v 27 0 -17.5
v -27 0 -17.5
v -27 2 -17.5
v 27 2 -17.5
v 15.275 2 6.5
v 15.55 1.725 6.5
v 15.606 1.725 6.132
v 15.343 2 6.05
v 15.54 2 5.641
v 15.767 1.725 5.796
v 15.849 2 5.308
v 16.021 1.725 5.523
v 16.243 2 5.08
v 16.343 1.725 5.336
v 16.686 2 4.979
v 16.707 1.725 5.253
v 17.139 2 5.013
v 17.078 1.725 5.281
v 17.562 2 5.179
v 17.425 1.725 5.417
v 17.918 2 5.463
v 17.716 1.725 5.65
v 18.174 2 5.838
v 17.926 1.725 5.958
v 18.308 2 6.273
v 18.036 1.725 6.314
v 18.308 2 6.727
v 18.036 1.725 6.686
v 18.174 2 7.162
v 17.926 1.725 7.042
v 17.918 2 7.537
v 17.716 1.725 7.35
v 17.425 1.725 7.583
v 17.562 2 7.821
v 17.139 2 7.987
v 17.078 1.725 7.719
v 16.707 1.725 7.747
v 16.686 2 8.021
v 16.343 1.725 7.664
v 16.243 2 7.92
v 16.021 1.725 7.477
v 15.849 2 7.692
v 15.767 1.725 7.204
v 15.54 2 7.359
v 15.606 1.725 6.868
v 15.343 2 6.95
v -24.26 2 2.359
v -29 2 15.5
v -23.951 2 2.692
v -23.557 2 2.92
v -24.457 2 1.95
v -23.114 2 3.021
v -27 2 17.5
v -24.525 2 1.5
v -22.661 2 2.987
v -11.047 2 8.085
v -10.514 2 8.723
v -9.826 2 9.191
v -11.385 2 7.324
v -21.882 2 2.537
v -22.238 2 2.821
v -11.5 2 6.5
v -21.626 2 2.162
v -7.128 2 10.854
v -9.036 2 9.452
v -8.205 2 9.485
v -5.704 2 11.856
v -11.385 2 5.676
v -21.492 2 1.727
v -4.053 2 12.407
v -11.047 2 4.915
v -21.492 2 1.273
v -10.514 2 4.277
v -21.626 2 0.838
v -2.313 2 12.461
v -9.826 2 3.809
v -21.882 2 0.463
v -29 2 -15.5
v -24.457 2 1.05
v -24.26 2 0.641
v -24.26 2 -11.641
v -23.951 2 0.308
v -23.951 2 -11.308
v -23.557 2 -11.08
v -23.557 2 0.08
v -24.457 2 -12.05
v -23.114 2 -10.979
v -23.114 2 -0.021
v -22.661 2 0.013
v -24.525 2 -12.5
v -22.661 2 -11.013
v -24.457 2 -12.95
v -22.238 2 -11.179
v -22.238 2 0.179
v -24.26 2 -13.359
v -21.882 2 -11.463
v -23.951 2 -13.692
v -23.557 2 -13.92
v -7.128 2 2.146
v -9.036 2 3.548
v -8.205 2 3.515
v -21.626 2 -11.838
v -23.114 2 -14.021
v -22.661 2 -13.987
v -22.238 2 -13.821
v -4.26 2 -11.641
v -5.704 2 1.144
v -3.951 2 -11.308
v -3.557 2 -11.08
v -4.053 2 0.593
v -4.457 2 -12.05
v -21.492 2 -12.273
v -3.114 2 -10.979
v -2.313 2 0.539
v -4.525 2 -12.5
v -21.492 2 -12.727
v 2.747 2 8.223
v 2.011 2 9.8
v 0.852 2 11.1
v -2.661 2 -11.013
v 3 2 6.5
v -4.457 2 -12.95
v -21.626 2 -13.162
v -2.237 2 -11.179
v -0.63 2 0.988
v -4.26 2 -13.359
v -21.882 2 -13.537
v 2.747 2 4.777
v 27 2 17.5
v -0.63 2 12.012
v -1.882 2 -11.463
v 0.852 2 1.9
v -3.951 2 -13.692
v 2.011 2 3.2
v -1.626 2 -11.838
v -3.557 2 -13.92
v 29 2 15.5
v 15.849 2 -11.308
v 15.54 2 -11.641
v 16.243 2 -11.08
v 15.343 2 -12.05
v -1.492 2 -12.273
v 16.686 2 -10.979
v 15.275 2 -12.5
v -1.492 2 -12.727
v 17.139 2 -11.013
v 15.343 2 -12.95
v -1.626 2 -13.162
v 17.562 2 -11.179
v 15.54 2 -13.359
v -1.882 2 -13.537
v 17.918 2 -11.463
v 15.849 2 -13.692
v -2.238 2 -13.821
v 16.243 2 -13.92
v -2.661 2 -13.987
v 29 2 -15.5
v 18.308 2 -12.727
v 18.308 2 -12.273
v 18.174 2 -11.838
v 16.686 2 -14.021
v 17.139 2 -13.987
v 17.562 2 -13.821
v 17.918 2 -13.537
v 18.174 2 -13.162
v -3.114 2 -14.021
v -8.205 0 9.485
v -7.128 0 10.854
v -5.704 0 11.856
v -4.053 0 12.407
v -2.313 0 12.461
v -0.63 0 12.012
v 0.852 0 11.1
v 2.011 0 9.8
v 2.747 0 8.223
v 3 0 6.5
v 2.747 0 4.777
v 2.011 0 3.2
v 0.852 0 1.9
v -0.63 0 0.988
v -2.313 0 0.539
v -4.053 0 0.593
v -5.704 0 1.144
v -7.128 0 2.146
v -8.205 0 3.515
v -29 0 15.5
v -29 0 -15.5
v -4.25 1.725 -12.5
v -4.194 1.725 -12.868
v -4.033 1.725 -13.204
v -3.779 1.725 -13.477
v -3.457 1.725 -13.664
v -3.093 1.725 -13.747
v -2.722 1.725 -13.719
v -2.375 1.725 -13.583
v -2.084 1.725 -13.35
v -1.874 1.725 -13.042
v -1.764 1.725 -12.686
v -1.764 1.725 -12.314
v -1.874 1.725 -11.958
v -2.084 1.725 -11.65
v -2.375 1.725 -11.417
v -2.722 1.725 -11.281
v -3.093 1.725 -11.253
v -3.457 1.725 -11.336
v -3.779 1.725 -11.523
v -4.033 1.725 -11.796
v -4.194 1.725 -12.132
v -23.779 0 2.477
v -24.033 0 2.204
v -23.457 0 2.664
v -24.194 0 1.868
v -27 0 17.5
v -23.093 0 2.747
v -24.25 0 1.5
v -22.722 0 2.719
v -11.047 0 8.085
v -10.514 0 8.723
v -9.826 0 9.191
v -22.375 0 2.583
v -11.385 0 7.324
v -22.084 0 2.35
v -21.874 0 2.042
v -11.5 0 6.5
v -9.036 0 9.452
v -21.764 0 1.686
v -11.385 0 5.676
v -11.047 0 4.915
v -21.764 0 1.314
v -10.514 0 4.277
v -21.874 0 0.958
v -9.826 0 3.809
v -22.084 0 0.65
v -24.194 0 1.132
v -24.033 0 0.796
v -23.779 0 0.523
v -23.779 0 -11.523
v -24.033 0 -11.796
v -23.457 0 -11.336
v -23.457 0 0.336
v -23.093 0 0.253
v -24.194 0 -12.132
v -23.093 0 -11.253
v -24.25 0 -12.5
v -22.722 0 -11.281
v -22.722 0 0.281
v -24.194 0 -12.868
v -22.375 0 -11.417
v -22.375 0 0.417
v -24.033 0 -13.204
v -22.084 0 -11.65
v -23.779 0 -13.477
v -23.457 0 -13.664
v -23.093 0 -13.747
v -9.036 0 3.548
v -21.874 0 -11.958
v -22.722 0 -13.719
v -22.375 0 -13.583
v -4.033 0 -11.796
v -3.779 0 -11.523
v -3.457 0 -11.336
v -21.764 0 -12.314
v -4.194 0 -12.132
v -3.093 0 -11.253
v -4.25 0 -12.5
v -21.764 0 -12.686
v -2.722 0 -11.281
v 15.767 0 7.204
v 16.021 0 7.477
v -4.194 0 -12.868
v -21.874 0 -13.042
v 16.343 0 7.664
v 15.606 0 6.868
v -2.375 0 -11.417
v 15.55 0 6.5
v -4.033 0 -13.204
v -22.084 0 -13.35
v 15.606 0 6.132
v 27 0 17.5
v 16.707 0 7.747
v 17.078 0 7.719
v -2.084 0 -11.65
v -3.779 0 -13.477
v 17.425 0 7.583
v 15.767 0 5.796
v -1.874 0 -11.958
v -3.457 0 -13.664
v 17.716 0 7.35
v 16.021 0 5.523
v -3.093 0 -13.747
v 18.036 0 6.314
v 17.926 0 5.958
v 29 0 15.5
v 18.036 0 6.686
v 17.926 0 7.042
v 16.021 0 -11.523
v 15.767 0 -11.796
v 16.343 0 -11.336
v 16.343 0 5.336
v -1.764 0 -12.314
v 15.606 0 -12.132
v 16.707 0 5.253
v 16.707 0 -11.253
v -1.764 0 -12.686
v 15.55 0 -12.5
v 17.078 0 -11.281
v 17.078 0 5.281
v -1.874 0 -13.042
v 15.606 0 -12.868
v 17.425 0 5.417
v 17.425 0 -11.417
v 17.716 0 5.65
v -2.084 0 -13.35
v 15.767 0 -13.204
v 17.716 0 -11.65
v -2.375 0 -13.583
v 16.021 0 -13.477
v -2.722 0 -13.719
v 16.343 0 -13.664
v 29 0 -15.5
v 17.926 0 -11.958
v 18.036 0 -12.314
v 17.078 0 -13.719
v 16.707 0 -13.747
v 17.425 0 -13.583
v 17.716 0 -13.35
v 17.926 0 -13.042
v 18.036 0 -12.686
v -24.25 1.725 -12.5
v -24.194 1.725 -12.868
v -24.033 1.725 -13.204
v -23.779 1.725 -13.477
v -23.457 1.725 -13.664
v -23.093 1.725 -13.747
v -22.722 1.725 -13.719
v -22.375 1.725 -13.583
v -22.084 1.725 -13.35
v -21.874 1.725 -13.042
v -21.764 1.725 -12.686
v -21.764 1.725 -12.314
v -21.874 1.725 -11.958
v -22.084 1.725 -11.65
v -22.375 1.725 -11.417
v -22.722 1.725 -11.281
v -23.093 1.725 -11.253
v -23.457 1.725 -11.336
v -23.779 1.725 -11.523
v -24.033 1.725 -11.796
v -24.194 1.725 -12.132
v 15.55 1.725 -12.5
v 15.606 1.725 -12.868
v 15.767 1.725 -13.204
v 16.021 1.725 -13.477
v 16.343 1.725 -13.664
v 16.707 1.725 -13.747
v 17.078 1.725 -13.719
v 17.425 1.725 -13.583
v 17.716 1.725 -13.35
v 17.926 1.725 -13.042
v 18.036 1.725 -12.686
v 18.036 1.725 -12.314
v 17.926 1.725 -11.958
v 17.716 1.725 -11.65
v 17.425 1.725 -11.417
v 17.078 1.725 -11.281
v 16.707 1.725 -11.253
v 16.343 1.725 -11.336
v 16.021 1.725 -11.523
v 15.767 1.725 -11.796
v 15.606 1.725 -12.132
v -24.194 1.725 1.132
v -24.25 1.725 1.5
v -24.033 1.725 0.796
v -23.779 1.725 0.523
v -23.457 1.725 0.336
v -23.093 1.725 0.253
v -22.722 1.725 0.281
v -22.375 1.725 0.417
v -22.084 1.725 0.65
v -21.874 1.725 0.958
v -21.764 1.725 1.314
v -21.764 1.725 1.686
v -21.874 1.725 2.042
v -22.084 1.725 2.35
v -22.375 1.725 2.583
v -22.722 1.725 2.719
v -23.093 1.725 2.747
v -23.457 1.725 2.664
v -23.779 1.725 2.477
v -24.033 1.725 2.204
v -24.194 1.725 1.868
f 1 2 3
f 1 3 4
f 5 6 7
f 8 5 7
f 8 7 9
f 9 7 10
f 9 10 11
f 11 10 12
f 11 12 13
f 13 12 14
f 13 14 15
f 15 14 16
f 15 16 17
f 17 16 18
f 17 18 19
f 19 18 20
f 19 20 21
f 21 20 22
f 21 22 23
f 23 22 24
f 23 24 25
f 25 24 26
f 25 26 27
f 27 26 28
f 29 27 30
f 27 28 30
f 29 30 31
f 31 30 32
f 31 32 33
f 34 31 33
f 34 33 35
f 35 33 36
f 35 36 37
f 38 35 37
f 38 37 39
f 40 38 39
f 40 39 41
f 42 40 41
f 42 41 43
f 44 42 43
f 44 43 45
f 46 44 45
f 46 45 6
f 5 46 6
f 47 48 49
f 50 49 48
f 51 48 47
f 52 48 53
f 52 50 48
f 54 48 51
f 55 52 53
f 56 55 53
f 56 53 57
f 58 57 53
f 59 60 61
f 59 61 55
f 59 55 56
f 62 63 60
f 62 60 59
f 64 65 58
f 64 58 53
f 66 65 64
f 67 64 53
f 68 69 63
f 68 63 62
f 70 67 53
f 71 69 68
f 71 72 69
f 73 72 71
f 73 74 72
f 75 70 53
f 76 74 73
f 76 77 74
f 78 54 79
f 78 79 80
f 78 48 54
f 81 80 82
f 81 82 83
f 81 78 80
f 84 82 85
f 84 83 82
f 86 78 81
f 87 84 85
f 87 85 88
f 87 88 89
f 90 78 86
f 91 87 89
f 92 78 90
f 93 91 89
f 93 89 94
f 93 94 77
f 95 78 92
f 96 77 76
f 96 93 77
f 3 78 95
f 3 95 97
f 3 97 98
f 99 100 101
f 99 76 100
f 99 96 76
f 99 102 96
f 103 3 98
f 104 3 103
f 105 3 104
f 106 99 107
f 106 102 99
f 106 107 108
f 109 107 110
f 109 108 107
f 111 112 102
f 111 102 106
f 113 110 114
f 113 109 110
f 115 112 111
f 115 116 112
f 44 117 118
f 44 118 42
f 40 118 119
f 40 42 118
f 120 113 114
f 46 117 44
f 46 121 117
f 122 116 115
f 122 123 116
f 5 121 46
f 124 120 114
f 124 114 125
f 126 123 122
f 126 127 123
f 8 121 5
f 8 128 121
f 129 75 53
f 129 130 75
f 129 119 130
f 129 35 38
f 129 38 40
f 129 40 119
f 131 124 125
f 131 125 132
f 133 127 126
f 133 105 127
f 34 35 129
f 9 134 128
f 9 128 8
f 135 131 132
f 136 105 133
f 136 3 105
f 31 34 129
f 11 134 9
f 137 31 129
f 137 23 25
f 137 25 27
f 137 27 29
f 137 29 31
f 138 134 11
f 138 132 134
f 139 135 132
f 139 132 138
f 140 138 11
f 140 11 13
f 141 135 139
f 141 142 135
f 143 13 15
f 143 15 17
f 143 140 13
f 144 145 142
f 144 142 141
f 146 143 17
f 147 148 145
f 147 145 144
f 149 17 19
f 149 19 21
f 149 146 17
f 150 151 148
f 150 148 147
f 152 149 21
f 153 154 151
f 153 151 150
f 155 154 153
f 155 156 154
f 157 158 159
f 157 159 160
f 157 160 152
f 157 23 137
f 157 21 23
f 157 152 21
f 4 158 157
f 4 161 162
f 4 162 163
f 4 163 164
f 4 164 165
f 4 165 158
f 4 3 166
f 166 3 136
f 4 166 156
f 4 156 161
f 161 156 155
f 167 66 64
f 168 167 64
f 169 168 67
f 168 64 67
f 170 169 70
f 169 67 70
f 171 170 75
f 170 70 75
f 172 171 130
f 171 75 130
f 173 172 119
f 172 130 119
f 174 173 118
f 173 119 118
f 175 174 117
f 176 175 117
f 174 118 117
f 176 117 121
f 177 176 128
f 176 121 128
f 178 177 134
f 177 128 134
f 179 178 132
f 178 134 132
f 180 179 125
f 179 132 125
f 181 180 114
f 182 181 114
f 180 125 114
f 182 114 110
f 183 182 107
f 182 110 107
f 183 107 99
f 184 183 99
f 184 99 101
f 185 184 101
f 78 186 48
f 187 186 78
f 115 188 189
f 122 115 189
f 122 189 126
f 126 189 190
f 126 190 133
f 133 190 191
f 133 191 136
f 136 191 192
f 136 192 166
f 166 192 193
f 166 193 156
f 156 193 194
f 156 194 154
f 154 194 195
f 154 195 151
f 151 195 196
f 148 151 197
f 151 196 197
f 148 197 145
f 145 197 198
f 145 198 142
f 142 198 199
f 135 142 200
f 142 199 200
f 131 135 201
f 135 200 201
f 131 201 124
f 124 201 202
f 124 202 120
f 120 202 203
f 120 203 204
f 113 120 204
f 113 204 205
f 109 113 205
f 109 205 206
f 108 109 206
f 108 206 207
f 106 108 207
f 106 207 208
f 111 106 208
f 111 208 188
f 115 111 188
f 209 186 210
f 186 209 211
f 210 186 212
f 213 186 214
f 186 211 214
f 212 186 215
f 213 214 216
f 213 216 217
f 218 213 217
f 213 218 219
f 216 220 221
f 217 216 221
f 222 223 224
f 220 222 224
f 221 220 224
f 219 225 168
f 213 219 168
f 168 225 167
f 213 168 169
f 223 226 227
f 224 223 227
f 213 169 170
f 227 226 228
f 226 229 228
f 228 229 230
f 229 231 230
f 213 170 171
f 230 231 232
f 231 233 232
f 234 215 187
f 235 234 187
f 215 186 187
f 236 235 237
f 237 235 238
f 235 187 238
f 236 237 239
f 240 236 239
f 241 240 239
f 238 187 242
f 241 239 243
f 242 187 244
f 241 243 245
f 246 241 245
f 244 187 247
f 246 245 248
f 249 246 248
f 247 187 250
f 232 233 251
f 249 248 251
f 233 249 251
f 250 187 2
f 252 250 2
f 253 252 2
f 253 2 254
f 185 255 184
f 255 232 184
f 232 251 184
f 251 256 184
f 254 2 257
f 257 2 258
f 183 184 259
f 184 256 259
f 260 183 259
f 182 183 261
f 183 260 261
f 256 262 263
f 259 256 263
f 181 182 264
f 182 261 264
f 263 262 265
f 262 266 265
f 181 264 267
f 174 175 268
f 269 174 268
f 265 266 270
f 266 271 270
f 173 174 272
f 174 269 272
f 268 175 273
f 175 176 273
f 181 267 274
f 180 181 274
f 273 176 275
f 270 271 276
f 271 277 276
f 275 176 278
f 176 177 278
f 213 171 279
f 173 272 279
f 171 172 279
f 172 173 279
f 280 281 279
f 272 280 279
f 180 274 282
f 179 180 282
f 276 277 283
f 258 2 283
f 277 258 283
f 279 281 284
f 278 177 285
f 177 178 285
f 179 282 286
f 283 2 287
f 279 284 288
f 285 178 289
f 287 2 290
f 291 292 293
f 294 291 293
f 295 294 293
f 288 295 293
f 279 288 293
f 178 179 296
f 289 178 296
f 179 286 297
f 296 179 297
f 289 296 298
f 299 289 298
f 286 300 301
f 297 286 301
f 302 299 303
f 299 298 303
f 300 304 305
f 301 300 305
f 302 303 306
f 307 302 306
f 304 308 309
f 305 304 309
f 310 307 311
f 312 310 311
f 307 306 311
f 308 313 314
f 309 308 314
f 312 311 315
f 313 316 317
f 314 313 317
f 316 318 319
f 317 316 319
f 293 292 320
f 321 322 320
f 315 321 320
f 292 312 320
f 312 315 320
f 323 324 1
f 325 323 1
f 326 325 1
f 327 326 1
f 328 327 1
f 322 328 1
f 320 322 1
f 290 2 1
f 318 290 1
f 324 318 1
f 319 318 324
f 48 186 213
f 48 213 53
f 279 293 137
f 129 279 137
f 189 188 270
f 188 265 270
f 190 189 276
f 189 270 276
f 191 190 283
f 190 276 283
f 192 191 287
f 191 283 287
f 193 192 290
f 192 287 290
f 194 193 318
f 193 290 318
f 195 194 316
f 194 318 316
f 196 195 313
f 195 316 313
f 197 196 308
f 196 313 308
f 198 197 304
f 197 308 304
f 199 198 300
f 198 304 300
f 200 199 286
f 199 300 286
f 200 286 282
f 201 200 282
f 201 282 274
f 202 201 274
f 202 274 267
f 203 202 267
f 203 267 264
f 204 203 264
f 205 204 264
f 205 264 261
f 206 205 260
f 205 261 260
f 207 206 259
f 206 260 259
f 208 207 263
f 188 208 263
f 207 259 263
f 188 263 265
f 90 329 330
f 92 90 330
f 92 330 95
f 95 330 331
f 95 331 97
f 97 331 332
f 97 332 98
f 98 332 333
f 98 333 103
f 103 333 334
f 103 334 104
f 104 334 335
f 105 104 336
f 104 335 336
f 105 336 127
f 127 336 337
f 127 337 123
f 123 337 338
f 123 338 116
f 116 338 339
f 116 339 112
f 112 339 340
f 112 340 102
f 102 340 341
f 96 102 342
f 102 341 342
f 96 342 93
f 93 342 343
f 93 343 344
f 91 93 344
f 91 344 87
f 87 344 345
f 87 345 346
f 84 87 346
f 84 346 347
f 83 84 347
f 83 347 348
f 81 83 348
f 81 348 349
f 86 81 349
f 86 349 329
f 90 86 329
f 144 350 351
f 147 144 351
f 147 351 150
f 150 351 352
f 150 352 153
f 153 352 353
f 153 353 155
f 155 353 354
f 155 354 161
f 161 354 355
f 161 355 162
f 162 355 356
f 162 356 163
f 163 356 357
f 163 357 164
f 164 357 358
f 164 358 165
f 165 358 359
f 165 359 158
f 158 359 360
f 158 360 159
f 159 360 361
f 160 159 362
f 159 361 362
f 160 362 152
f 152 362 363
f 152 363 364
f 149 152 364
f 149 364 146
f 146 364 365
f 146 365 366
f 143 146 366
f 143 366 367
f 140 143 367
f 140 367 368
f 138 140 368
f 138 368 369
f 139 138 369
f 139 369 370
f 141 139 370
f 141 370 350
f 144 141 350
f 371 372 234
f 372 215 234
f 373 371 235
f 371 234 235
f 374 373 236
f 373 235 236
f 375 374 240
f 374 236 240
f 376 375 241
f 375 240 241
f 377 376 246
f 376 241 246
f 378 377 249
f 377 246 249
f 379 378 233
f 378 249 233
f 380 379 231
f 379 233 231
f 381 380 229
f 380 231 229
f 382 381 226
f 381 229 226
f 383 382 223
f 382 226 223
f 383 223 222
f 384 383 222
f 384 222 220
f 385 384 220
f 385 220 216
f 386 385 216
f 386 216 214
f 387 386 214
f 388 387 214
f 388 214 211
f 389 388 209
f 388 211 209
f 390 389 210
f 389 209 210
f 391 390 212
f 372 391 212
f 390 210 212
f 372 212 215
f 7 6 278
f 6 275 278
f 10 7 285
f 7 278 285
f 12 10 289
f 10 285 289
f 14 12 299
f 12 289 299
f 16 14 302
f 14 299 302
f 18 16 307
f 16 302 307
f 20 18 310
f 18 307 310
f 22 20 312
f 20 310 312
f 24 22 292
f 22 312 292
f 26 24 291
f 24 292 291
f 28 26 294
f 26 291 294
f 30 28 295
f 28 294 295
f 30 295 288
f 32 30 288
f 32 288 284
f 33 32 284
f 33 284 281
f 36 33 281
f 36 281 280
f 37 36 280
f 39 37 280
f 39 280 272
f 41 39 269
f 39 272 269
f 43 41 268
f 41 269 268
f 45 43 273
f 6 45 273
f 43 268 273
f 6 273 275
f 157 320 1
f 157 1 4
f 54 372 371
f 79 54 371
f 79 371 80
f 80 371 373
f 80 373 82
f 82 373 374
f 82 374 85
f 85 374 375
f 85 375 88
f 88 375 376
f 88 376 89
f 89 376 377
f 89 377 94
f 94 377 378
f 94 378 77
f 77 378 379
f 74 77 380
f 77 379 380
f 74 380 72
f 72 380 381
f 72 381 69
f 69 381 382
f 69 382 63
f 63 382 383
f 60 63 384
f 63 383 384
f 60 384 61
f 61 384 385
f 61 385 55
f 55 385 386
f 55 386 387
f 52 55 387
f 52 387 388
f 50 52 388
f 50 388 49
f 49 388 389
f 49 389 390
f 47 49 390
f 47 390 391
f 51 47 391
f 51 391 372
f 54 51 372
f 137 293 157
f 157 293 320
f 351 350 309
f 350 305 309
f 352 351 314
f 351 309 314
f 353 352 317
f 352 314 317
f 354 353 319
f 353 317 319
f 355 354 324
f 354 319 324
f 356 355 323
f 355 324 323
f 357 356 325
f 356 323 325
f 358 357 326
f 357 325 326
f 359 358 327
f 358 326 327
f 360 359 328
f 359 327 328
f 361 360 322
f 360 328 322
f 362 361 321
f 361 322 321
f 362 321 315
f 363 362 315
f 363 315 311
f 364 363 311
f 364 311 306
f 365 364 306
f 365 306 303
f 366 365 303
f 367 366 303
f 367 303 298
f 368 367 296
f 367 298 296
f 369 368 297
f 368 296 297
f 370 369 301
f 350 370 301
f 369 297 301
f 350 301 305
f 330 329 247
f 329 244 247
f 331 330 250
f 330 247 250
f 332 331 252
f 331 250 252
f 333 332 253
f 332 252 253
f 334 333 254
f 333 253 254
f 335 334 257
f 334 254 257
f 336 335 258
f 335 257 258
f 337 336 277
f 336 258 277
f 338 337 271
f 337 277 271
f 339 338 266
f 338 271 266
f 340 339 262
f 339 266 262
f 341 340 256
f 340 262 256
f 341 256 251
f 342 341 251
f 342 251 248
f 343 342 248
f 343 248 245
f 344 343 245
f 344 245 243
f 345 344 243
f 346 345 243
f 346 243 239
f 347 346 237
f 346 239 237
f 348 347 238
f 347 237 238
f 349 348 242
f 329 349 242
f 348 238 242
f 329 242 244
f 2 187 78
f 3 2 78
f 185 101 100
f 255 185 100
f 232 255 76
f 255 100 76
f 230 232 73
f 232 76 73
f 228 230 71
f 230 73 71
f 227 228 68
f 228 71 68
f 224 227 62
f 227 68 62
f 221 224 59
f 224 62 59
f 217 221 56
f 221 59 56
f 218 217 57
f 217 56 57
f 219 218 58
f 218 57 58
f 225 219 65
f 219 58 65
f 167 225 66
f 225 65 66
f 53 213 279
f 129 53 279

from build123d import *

# Parameters (mm, degrees)
SKETCH1_W                       = 58
SKETCH1_H                       = 35
BOSS_EXTRUDE1_DEPTH             = 2
M3X0_5_TAPPED_HOLE1_D           = 2.5
M3X0_5_TAPPED_HOLE1_CSINK_D     = 3.05
M3X0_5_TAPPED_HOLE1_CSINK_ANGLE = 90
CUT_EXTRUDE1_DEPTH              = 34.930075155
CHAMFER1_SIZE                   = 2


with BuildPart() as part:
    # Sketch1 → Boss-Extrude1 (new body)
    with BuildSketch(Plane(origin=(0, 0, 0), x_dir=(1, 0, 0), z_dir=(0, 1, 0))):
        Rectangle(SKETCH1_W, SKETCH1_H)
    extrude(amount=BOSS_EXTRUDE1_DEPTH)

    # M3x0.5 Tapped Hole1 (through all)
    with Locations(Plane(origin=(0, 2, 0), x_dir=(1, 0, 0), z_dir=(0, 1, 0))):
        with Locations((-23, 12.5), (-3, 12.5), (16.8, 12.5), (16.8, -6.5), (-23, -1.5)):
            CounterSinkHole(M3X0_5_TAPPED_HOLE1_D / 2, M3X0_5_TAPPED_HOLE1_CSINK_D / 2, counter_sink_angle=M3X0_5_TAPPED_HOLE1_CSINK_ANGLE)

    # Sketch4 → Cut-Extrude1 (cut, through all)
    with BuildSketch(Plane(origin=(0, 2, 0), x_dir=(1, 0, 0), z_dir=(0, 1, 0))):
        with BuildLine():
            ThreePointArc((-8.204545455, -3.514584349), (-11.5, -6.5), (-8.204545455, -9.485415651))
            ThreePointArc((-8.204545455, -9.485415651), (3, -6.5), (-8.204545455, -3.514584349))
        make_face()
    extrude(amount=-CUT_EXTRUDE1_DEPTH, mode=Mode.SUBTRACT)

    # Chamfer1
    chamfer1_edges = [part.edges().sort_by_distance(p)[0] for p in [
        (29, 1, 17.5),
        (-29, 1, 17.5),
        (-29, 1, -17.5),
        (29, 1, -17.5),
    ]]
    chamfer(chamfer1_edges, length=CHAMFER1_SIZE)


solid = part.part
